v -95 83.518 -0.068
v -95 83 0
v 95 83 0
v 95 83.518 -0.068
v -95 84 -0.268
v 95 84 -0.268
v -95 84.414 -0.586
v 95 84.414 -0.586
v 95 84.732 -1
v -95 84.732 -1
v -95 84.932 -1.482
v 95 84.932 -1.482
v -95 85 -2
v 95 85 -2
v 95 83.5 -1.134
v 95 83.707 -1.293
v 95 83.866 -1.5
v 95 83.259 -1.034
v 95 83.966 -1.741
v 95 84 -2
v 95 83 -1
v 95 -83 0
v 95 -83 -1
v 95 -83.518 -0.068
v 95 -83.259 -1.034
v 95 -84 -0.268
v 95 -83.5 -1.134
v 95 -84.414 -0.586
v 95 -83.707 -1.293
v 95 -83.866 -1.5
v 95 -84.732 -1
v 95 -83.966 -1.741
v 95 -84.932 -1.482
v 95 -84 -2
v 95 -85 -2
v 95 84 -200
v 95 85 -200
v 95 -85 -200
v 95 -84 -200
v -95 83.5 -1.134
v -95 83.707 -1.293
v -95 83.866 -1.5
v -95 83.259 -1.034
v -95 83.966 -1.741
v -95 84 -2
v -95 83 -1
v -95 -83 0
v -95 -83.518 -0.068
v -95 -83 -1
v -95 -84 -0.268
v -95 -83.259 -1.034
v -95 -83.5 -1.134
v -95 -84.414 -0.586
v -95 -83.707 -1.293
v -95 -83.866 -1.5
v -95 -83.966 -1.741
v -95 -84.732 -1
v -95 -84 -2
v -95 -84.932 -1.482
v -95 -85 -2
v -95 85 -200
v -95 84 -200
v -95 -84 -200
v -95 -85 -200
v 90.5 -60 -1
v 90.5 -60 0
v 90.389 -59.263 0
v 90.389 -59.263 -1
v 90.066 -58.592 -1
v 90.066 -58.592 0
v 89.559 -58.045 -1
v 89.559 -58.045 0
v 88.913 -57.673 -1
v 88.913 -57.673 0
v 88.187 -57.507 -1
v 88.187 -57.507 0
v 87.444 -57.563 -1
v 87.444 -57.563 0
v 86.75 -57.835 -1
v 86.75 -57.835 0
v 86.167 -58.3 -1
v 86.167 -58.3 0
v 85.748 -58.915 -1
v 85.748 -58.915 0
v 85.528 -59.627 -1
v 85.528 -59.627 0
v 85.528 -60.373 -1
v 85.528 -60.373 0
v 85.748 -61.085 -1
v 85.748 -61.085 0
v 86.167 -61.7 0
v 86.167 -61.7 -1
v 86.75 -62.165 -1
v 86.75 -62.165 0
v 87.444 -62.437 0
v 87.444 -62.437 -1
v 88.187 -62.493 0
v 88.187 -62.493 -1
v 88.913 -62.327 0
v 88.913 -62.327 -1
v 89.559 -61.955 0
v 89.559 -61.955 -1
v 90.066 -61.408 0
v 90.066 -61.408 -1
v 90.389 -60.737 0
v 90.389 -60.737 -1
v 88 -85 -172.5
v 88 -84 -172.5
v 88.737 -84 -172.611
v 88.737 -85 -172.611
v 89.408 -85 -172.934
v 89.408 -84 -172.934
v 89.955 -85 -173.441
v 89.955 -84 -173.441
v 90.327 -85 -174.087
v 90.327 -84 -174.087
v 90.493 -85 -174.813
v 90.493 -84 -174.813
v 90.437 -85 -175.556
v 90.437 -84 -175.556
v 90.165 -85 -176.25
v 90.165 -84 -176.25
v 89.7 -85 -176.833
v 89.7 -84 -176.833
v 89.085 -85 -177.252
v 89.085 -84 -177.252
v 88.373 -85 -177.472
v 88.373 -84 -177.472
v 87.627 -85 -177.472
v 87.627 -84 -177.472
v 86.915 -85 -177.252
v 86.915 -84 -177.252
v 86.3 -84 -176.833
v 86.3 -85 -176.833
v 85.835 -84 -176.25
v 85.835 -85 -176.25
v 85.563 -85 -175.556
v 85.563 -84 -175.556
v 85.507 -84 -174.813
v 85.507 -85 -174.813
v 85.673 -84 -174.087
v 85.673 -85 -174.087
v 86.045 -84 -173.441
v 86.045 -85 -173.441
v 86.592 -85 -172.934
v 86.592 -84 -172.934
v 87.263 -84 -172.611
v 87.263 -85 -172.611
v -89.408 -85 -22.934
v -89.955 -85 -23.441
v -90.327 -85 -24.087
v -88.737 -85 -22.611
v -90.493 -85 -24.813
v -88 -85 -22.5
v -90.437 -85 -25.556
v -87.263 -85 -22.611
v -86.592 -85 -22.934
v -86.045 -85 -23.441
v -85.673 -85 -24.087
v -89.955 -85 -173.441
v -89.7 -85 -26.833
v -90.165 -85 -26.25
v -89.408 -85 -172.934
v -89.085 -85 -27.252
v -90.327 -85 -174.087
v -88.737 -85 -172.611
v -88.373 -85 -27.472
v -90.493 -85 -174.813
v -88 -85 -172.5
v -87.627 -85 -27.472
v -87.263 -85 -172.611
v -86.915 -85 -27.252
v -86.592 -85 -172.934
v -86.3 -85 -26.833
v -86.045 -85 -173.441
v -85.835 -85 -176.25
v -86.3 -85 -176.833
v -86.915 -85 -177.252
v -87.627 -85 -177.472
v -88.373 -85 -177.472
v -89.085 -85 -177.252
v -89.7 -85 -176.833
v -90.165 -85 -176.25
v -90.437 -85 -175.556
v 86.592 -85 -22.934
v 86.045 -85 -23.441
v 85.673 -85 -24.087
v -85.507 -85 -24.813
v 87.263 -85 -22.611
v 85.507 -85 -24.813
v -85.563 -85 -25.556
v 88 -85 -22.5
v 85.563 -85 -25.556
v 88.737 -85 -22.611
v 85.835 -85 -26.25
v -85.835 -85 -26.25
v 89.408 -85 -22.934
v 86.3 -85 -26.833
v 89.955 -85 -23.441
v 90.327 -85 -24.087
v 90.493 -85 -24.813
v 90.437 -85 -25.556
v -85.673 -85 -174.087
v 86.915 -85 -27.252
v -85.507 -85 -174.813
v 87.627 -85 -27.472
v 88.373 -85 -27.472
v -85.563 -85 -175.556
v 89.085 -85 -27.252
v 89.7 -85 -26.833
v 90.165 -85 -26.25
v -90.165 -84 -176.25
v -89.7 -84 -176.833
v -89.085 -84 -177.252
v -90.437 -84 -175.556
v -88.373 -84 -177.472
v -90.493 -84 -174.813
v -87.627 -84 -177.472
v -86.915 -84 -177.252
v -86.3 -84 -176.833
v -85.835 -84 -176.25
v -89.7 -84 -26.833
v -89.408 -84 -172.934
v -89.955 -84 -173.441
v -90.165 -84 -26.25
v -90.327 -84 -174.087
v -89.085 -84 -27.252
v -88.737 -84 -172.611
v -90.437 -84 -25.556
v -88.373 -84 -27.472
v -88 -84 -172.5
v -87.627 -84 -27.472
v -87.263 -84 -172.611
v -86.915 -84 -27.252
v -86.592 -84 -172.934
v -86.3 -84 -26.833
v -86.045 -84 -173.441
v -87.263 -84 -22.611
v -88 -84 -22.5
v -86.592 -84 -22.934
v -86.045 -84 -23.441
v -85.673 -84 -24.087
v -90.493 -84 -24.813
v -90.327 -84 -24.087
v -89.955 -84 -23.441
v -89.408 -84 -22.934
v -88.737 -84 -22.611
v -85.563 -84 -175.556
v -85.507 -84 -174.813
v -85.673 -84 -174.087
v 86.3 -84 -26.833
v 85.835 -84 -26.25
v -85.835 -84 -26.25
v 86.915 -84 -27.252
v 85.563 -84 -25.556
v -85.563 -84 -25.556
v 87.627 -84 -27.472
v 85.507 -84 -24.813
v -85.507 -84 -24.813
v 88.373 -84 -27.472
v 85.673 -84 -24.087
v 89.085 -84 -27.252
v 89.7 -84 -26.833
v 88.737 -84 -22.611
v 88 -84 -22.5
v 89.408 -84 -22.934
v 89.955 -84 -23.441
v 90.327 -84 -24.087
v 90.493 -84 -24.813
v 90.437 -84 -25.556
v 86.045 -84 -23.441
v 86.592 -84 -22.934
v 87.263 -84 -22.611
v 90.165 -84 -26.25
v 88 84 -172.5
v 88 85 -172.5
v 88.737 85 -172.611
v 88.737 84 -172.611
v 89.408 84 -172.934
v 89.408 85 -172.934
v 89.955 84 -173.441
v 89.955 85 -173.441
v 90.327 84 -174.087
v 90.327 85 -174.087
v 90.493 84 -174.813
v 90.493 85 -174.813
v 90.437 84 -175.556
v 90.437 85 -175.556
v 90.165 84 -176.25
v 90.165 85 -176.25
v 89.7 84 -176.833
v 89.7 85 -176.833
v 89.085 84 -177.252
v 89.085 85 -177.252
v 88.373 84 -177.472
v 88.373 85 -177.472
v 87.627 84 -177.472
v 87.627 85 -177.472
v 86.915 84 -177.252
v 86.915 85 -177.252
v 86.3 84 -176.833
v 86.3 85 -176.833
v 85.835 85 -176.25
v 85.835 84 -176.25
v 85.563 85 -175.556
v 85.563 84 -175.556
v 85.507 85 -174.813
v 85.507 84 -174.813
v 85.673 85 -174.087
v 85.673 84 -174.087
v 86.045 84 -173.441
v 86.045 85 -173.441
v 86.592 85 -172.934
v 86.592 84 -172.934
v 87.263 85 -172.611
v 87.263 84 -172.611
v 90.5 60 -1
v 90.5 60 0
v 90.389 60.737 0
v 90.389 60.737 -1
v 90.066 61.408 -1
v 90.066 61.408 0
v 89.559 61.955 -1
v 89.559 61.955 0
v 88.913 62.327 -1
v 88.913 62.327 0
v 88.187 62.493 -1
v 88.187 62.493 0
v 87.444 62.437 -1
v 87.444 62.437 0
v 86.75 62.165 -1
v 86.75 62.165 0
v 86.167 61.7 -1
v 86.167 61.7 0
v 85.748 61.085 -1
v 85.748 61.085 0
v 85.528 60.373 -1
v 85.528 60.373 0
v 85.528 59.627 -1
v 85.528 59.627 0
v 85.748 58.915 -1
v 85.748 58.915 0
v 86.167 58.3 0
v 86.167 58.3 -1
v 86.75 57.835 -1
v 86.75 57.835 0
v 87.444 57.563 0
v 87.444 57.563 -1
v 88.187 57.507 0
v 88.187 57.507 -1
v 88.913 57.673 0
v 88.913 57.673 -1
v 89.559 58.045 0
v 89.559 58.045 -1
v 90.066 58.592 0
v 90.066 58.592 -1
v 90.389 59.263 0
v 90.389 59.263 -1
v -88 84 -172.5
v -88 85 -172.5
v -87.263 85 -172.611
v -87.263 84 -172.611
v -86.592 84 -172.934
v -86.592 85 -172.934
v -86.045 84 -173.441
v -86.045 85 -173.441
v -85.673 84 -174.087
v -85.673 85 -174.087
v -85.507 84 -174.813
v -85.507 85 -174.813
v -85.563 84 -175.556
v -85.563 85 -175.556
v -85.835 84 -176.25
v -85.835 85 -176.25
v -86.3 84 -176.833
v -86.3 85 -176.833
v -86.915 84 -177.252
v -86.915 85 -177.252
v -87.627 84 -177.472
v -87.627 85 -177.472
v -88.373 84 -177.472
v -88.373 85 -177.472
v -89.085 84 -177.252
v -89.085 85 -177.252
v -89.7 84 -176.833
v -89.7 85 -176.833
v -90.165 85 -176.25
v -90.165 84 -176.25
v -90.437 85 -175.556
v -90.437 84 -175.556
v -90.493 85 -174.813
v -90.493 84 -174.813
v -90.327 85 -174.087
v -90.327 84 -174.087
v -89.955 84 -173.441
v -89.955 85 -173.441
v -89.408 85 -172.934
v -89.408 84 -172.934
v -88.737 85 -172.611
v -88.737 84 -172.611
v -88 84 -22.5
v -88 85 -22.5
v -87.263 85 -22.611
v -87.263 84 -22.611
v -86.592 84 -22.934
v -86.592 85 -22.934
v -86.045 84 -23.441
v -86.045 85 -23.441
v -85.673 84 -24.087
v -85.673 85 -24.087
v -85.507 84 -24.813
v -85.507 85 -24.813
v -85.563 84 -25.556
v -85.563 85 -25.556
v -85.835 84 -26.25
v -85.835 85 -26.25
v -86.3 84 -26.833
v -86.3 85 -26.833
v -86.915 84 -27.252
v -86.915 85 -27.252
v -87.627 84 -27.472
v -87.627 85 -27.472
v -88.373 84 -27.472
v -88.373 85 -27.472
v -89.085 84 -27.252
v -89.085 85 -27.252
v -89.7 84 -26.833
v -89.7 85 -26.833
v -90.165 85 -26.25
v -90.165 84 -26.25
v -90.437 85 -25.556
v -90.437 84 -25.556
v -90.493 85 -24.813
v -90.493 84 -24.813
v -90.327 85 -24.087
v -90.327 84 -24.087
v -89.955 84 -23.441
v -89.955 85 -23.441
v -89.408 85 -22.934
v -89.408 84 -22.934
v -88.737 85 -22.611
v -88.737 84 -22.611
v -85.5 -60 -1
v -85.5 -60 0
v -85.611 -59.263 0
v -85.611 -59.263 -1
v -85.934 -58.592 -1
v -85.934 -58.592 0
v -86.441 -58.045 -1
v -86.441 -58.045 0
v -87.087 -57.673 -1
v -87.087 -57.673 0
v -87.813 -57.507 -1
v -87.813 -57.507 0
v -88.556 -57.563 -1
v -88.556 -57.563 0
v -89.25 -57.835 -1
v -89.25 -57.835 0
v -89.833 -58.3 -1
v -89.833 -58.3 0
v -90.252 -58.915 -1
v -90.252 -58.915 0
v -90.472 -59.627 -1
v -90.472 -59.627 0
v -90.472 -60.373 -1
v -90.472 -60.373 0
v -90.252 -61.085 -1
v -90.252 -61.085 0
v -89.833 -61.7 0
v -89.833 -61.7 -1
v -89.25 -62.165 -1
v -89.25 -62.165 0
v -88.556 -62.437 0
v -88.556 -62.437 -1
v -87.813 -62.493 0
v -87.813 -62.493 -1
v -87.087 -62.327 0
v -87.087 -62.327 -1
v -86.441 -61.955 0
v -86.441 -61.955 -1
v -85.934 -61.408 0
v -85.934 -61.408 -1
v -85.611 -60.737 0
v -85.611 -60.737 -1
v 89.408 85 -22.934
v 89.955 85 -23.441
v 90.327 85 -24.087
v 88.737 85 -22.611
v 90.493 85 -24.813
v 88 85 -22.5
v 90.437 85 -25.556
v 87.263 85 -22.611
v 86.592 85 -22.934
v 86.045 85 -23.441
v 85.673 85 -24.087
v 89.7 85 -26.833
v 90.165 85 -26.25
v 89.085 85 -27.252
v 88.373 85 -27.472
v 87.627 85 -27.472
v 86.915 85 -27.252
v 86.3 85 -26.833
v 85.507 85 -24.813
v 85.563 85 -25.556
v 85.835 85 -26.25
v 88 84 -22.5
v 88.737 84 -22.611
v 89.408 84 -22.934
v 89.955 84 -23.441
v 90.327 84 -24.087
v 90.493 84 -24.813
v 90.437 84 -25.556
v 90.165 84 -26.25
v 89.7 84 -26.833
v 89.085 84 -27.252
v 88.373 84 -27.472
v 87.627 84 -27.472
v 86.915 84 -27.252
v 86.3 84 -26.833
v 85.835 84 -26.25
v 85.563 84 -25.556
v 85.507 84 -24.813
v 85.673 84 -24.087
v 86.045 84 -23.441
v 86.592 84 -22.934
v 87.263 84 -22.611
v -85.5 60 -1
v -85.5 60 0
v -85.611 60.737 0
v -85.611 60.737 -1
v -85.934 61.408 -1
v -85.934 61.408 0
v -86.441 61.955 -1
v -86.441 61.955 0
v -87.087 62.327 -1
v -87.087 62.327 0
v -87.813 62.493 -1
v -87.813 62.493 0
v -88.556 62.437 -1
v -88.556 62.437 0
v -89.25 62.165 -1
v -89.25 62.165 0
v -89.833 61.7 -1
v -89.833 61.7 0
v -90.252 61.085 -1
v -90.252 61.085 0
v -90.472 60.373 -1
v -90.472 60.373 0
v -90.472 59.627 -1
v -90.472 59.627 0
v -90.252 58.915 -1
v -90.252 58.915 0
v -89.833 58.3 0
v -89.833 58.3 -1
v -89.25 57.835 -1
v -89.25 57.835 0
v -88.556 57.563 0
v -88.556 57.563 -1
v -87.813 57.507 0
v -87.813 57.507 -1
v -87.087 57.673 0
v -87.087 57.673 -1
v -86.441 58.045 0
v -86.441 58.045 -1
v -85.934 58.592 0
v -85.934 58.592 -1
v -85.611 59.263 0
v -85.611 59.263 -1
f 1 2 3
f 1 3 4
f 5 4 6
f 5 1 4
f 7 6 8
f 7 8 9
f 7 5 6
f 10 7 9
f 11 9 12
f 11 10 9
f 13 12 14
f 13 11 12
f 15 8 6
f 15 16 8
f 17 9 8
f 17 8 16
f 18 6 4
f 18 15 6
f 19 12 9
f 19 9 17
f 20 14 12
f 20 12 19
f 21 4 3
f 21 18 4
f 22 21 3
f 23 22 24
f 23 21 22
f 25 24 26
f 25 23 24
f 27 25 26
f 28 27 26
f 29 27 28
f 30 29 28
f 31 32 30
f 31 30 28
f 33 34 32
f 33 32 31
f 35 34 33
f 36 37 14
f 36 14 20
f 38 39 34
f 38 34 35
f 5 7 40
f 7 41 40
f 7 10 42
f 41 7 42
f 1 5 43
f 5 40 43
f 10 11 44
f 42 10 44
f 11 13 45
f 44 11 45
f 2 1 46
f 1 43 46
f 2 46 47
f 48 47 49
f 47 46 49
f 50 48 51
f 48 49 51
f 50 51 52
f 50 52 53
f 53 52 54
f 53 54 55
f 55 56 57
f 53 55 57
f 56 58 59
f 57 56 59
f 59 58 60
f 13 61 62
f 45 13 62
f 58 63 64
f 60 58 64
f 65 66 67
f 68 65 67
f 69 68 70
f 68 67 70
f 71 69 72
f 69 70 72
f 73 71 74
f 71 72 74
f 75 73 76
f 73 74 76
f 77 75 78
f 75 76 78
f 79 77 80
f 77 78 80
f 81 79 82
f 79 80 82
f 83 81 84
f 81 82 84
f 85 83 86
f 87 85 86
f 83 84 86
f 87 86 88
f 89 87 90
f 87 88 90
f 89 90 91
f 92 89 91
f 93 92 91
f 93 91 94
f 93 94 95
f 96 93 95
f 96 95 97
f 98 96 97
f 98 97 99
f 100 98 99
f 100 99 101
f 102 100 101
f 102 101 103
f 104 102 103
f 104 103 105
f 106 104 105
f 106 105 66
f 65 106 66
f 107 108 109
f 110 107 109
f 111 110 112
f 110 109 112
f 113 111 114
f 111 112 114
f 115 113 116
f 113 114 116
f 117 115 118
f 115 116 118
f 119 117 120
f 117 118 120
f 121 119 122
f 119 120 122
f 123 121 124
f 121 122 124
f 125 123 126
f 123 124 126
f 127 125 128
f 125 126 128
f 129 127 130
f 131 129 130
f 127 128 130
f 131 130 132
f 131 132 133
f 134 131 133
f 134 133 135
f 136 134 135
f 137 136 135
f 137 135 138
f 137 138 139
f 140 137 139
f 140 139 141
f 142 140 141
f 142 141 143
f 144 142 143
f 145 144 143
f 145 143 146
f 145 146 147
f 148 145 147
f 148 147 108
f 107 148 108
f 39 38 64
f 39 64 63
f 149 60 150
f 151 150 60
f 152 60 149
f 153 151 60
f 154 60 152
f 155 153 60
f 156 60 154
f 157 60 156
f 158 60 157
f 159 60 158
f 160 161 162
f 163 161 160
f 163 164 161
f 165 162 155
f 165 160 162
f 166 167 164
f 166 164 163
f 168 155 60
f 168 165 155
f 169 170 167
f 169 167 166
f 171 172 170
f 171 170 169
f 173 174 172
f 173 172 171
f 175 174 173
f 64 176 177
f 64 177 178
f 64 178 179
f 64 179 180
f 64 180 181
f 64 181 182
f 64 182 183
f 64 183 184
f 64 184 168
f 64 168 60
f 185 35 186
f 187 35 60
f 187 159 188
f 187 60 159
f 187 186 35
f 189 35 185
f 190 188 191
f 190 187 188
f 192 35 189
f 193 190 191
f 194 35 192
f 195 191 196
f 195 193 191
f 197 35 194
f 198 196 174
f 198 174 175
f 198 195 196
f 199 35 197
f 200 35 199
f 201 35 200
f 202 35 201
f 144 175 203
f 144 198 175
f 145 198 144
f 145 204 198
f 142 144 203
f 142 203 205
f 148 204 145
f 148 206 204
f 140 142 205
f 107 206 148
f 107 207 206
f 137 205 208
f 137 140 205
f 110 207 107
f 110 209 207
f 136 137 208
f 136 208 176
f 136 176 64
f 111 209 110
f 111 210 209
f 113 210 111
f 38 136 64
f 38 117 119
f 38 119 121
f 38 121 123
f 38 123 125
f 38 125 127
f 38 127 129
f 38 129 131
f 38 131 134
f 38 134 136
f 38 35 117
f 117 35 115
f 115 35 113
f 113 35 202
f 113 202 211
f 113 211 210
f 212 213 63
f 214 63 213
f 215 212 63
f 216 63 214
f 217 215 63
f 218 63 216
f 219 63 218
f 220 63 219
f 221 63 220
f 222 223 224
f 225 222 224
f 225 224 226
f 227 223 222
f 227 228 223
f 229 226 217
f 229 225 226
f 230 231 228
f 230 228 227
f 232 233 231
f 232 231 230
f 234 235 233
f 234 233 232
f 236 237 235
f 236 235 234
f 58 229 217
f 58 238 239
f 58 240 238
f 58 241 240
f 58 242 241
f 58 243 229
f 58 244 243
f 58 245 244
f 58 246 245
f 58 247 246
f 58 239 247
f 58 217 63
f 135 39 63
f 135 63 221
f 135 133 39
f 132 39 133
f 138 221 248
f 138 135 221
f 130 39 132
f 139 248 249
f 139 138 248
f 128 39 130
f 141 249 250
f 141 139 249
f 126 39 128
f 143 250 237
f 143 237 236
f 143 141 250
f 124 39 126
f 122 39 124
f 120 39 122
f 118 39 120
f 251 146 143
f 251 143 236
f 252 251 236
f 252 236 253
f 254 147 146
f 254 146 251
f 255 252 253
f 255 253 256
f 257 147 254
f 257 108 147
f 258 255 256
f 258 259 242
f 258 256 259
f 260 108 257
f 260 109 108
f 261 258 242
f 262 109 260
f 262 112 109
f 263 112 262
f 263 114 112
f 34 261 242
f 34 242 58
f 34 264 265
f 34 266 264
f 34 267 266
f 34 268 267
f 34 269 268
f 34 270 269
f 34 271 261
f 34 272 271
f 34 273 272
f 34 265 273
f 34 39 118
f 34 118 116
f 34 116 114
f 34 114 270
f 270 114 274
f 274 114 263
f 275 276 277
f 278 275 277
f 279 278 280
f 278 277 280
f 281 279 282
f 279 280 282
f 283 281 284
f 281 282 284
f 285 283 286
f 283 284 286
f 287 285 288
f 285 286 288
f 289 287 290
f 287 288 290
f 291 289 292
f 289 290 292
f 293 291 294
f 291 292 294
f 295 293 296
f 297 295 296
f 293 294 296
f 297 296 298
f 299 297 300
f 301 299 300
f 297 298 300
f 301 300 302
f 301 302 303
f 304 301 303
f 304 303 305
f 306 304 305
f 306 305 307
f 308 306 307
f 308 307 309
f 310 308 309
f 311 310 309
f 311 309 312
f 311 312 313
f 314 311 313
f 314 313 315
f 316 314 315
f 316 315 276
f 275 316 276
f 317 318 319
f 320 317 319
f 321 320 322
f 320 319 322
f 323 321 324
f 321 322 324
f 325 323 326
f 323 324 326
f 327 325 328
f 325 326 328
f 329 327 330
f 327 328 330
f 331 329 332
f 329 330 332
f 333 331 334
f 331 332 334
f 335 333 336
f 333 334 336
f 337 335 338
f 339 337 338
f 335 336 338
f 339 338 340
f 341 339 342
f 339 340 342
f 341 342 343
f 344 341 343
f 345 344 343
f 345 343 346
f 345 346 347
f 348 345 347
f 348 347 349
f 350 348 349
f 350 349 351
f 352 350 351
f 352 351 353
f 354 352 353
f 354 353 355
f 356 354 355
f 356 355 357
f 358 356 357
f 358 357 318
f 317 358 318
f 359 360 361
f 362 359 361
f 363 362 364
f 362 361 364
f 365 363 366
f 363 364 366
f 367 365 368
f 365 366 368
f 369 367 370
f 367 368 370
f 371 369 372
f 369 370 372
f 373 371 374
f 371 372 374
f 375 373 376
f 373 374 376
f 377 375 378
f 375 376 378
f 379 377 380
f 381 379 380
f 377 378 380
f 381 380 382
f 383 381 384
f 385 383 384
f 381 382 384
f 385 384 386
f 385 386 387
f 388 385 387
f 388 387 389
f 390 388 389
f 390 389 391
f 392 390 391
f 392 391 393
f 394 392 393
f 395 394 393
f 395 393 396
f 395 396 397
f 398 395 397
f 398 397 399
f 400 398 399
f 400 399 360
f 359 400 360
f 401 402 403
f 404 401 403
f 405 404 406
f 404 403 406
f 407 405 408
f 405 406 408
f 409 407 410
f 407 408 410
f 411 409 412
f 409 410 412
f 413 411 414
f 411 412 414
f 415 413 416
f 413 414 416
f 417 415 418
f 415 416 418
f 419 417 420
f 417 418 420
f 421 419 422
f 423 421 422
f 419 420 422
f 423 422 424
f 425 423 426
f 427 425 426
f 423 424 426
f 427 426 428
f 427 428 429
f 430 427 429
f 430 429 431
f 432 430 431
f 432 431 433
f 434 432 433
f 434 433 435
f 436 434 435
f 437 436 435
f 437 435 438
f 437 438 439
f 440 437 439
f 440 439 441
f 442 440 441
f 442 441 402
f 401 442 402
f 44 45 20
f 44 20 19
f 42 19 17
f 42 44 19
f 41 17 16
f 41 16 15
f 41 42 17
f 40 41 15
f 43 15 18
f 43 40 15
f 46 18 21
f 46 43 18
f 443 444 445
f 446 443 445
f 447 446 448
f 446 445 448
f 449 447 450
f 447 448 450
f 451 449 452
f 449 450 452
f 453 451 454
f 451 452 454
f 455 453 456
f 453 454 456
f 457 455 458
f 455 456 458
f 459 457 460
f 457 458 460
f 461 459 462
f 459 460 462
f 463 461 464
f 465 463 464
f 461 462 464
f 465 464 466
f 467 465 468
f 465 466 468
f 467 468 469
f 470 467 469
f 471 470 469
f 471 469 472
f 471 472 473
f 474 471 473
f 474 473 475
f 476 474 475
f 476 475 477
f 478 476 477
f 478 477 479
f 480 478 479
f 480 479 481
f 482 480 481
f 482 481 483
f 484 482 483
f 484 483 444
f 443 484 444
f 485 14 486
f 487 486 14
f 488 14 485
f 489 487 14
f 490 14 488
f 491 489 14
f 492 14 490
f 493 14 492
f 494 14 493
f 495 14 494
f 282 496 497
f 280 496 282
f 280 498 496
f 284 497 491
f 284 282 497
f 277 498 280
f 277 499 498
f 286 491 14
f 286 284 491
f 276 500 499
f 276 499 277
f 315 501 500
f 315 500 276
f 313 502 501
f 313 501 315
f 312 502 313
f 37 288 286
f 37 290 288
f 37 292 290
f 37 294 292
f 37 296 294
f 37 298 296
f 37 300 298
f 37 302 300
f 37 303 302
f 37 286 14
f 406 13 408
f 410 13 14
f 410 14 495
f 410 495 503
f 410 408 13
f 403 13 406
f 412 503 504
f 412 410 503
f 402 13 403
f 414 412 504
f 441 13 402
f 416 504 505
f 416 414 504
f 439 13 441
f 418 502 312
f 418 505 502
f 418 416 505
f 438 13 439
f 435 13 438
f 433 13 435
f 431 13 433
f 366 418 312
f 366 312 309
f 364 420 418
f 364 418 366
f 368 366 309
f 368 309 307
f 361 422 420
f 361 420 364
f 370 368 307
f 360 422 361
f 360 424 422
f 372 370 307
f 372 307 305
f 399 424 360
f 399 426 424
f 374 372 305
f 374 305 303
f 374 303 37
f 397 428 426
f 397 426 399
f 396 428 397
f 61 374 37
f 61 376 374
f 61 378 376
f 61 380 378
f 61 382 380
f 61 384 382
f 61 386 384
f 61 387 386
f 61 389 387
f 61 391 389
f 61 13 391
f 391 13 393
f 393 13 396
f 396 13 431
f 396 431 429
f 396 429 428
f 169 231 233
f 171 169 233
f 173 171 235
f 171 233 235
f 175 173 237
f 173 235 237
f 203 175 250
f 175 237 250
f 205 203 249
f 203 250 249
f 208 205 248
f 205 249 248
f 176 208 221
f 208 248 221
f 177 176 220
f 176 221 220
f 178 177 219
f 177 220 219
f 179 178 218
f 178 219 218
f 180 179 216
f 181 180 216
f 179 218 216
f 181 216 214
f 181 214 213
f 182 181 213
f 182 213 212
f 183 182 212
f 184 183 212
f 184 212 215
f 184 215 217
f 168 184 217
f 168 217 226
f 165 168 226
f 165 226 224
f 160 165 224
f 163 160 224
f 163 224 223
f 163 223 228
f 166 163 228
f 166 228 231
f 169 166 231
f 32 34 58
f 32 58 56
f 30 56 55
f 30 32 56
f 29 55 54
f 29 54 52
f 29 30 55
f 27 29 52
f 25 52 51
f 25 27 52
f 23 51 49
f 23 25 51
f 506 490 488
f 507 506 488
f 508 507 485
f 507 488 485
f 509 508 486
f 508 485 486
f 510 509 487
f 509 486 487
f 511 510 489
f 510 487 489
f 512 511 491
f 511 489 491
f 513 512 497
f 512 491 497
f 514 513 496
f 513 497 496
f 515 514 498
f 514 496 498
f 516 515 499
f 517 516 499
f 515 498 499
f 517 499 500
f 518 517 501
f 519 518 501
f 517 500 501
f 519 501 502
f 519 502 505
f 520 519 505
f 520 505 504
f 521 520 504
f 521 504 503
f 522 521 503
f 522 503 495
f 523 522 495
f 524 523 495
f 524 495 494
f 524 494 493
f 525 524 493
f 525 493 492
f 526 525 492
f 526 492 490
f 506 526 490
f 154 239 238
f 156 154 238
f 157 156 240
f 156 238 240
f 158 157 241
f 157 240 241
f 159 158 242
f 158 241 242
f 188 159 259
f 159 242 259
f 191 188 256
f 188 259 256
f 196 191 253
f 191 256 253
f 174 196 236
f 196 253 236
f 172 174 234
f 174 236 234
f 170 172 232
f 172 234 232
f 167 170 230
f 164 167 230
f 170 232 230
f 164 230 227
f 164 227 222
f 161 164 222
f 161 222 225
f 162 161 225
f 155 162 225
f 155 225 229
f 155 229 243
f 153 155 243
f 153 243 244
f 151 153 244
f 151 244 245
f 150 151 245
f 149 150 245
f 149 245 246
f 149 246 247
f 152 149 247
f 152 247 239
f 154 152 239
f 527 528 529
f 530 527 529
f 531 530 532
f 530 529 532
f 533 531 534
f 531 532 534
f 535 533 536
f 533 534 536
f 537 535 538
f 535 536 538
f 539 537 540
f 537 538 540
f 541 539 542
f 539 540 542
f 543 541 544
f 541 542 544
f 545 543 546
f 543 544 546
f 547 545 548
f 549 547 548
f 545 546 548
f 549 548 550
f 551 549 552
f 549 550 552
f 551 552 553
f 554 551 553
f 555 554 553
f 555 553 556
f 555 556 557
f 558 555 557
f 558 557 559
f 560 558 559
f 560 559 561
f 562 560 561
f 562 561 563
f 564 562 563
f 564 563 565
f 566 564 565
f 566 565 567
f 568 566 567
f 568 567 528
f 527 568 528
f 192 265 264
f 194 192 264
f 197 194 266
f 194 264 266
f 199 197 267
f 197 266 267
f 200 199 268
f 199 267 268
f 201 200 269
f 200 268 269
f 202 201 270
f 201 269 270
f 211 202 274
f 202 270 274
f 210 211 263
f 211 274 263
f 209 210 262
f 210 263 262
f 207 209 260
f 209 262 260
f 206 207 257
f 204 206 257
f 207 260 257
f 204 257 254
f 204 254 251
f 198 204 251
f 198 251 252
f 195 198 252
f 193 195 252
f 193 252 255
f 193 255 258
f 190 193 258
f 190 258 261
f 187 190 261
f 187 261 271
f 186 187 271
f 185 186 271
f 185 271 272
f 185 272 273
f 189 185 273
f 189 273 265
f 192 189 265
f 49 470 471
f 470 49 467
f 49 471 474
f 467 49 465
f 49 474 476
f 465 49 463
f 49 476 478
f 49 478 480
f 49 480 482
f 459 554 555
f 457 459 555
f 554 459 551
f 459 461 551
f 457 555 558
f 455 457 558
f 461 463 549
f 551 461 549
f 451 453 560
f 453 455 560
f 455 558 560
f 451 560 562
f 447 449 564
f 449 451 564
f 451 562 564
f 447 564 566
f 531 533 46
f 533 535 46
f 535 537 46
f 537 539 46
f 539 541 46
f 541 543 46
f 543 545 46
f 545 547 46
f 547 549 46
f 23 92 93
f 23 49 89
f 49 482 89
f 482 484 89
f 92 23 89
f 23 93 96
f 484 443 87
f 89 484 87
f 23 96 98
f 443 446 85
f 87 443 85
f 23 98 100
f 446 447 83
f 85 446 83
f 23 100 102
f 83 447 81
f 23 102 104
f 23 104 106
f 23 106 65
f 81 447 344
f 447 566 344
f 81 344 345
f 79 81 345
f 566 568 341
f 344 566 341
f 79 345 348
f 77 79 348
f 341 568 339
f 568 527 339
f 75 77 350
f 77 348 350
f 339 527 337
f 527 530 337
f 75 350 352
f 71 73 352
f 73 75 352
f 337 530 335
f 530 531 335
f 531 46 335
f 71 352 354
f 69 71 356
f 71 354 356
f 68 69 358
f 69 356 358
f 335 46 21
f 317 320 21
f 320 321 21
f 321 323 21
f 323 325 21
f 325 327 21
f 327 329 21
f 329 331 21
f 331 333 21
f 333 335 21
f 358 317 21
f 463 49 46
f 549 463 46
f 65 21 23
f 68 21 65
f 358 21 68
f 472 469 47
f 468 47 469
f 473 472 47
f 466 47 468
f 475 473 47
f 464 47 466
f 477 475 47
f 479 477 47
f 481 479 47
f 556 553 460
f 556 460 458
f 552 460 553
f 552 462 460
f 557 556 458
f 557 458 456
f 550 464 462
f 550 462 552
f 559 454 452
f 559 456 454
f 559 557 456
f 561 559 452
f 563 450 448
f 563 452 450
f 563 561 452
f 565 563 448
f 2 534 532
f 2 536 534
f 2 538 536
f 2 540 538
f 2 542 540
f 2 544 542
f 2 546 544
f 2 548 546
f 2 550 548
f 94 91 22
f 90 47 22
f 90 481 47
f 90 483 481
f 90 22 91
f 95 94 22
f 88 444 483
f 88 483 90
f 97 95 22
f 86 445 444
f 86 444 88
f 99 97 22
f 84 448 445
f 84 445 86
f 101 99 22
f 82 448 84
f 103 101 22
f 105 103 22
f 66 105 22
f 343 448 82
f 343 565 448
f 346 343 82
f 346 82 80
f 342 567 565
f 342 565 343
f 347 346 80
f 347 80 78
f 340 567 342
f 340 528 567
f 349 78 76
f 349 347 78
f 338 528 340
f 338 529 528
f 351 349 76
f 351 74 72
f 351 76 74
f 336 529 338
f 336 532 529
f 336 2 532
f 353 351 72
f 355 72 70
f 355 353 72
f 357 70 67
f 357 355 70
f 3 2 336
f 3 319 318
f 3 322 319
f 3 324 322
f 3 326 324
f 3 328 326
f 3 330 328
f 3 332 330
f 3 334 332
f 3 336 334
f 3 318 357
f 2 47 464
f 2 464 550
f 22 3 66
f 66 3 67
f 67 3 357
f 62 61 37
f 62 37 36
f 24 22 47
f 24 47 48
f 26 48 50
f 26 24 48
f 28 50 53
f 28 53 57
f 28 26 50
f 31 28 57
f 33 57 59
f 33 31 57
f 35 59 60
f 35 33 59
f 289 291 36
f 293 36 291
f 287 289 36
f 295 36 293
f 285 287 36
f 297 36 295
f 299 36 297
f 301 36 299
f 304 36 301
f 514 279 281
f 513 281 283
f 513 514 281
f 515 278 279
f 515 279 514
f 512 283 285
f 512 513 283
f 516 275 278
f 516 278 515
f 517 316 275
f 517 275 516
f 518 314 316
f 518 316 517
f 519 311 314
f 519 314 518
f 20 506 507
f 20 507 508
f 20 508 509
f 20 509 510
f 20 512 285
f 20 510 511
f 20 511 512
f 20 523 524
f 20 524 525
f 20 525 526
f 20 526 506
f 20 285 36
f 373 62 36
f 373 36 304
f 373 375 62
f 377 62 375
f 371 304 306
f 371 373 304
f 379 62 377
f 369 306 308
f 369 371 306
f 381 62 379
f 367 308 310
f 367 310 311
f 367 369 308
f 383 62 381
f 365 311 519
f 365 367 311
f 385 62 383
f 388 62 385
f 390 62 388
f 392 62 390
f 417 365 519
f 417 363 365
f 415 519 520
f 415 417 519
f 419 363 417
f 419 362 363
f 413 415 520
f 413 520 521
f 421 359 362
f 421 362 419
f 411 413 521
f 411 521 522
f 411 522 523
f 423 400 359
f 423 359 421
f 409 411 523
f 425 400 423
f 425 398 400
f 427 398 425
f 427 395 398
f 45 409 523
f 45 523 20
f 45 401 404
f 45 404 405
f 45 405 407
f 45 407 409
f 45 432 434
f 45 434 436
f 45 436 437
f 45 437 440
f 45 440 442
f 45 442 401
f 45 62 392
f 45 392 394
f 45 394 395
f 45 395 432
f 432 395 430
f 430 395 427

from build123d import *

# Parameters (mm, degrees)
SKETCH1_W                      = 190
SKETCH1_H                      = 170
BASE_FLANGE1_DEPTH             = 1
SKETCH23_R                     = 2.5
CUT_EXTRUDE1_DEPTH             = 10
EDGE_FLANGE5_STRIP_W           = 6
EDGE_FLANGE5_STRIP_H           = 1
EDGE_FLANGE5_STRIP_CUT_DEPTH   = 190
EDGE_FLANGE5_STRIP_2_W         = 6
EDGE_FLANGE5_STRIP_2_H         = 1
EDGE_FLANGE5_STRIP_CUT_2_DEPTH = 190
EDGE_FLANGE5_DEPTH             = 190
EDGE_FLANGE5_BEND_DEPTH        = 190
SKETCH44_R                     = 2.5
CUT_EXTRUDE2_DEPTH             = 180


# Sheet-metal steps are written as plain solids
with BuildPart() as part:
    # Sketch1 → Base-Flange1 (new body)
    with BuildSketch(Plane.XY):
        Rectangle(SKETCH1_W, SKETCH1_H)
    extrude(amount=-BASE_FLANGE1_DEPTH)

    # Sketch23 → Cut-Extrude1 (cut)
    with BuildSketch(Plane.XY):
        with Locations((-88, 60)):
            Circle(SKETCH23_R)
        with Locations((88, 60)):
            Circle(SKETCH23_R)
        with Locations((88, -60)):
            Circle(SKETCH23_R)
        with Locations((-88, -60)):
            Circle(SKETCH23_R)
    extrude(amount=-CUT_EXTRUDE1_DEPTH, mode=Mode.SUBTRACT)

    # Edge-Flange5 strip (across the edge) → Edge-Flange5 strip cut (cut)
    with BuildSketch(Plane(origin=(-95, 85, -1), x_dir=(0, -1, 0), z_dir=(1, 0, 0))):
        with Locations((-1, -0.5)):
            Rectangle(EDGE_FLANGE5_STRIP_W, EDGE_FLANGE5_STRIP_H)
    extrude(amount=EDGE_FLANGE5_STRIP_CUT_DEPTH, mode=Mode.SUBTRACT)

    # Edge-Flange5 strip 2 (across the edge) → Edge-Flange5 strip cut 2 (cut)
    with BuildSketch(Plane(origin=(95, -85, -1), x_dir=(0, 1, 0), z_dir=(-1, 0, 0))):
        with Locations((-1, -0.5)):
            Rectangle(EDGE_FLANGE5_STRIP_2_W, EDGE_FLANGE5_STRIP_2_H)
    extrude(amount=EDGE_FLANGE5_STRIP_CUT_2_DEPTH, mode=Mode.SUBTRACT)

    # Edge-Flange5 section (across the edge) → Edge-Flange5 (add)
    with BuildSketch(Plane(origin=(-95, 85, -1), x_dir=(0, -1, 0), z_dir=(1, 0, 0))):
        with BuildLine():
            Line((0, 1), (0, 199))
            Line((0, 199), (1, 199))
            Line((1, 199), (1, 1))
            ThreePointArc((1, 1), (1.292893219, 0.292893219), (2, 0))
            Line((2, 0), (2, -1))
            ThreePointArc((2, -1), (0.585786438, -0.414213562), (0, 1))
        make_face()
    extrude(amount=EDGE_FLANGE5_DEPTH)

    # Edge-Flange5 section 2 (across the edge) → Edge-Flange5 bend (add)
    with BuildSketch(Plane(origin=(95, -85, -1), x_dir=(0, 1, 0), z_dir=(-1, 0, 0))):
        with BuildLine():
            Line((0, 1), (0, 199))
            Line((0, 199), (1, 199))
            Line((1, 199), (1, 1))
            ThreePointArc((1, 1), (1.292893219, 0.292893219), (2, 0))
            Line((2, 0), (2, -1))
            ThreePointArc((2, -1), (0.585786438, -0.414213562), (0, 1))
        make_face()
    extrude(amount=EDGE_FLANGE5_BEND_DEPTH)

    # Sketch44 → Cut-Extrude2 (cut)
    with BuildSketch(Plane(origin=(0, 85, 0), x_dir=(1, 0, 0), z_dir=(0, 1, 0))):
        with Locations(Location((-88, 175, 0), (0, 0, 270))):
            Circle(SKETCH44_R)
        with Locations(Location((88, 175, 0), (0, 0, 270))):
            Circle(SKETCH44_R)
        with Locations(Location((88, 25, 0), (0, 0, 270))):
            Circle(SKETCH44_R)
        with Locations(Location((-88, 25, 0), (0, 0, 270))):
            Circle(SKETCH44_R)
    extrude(amount=-CUT_EXTRUDE2_DEPTH, mode=Mode.SUBTRACT)


solid = part.part
